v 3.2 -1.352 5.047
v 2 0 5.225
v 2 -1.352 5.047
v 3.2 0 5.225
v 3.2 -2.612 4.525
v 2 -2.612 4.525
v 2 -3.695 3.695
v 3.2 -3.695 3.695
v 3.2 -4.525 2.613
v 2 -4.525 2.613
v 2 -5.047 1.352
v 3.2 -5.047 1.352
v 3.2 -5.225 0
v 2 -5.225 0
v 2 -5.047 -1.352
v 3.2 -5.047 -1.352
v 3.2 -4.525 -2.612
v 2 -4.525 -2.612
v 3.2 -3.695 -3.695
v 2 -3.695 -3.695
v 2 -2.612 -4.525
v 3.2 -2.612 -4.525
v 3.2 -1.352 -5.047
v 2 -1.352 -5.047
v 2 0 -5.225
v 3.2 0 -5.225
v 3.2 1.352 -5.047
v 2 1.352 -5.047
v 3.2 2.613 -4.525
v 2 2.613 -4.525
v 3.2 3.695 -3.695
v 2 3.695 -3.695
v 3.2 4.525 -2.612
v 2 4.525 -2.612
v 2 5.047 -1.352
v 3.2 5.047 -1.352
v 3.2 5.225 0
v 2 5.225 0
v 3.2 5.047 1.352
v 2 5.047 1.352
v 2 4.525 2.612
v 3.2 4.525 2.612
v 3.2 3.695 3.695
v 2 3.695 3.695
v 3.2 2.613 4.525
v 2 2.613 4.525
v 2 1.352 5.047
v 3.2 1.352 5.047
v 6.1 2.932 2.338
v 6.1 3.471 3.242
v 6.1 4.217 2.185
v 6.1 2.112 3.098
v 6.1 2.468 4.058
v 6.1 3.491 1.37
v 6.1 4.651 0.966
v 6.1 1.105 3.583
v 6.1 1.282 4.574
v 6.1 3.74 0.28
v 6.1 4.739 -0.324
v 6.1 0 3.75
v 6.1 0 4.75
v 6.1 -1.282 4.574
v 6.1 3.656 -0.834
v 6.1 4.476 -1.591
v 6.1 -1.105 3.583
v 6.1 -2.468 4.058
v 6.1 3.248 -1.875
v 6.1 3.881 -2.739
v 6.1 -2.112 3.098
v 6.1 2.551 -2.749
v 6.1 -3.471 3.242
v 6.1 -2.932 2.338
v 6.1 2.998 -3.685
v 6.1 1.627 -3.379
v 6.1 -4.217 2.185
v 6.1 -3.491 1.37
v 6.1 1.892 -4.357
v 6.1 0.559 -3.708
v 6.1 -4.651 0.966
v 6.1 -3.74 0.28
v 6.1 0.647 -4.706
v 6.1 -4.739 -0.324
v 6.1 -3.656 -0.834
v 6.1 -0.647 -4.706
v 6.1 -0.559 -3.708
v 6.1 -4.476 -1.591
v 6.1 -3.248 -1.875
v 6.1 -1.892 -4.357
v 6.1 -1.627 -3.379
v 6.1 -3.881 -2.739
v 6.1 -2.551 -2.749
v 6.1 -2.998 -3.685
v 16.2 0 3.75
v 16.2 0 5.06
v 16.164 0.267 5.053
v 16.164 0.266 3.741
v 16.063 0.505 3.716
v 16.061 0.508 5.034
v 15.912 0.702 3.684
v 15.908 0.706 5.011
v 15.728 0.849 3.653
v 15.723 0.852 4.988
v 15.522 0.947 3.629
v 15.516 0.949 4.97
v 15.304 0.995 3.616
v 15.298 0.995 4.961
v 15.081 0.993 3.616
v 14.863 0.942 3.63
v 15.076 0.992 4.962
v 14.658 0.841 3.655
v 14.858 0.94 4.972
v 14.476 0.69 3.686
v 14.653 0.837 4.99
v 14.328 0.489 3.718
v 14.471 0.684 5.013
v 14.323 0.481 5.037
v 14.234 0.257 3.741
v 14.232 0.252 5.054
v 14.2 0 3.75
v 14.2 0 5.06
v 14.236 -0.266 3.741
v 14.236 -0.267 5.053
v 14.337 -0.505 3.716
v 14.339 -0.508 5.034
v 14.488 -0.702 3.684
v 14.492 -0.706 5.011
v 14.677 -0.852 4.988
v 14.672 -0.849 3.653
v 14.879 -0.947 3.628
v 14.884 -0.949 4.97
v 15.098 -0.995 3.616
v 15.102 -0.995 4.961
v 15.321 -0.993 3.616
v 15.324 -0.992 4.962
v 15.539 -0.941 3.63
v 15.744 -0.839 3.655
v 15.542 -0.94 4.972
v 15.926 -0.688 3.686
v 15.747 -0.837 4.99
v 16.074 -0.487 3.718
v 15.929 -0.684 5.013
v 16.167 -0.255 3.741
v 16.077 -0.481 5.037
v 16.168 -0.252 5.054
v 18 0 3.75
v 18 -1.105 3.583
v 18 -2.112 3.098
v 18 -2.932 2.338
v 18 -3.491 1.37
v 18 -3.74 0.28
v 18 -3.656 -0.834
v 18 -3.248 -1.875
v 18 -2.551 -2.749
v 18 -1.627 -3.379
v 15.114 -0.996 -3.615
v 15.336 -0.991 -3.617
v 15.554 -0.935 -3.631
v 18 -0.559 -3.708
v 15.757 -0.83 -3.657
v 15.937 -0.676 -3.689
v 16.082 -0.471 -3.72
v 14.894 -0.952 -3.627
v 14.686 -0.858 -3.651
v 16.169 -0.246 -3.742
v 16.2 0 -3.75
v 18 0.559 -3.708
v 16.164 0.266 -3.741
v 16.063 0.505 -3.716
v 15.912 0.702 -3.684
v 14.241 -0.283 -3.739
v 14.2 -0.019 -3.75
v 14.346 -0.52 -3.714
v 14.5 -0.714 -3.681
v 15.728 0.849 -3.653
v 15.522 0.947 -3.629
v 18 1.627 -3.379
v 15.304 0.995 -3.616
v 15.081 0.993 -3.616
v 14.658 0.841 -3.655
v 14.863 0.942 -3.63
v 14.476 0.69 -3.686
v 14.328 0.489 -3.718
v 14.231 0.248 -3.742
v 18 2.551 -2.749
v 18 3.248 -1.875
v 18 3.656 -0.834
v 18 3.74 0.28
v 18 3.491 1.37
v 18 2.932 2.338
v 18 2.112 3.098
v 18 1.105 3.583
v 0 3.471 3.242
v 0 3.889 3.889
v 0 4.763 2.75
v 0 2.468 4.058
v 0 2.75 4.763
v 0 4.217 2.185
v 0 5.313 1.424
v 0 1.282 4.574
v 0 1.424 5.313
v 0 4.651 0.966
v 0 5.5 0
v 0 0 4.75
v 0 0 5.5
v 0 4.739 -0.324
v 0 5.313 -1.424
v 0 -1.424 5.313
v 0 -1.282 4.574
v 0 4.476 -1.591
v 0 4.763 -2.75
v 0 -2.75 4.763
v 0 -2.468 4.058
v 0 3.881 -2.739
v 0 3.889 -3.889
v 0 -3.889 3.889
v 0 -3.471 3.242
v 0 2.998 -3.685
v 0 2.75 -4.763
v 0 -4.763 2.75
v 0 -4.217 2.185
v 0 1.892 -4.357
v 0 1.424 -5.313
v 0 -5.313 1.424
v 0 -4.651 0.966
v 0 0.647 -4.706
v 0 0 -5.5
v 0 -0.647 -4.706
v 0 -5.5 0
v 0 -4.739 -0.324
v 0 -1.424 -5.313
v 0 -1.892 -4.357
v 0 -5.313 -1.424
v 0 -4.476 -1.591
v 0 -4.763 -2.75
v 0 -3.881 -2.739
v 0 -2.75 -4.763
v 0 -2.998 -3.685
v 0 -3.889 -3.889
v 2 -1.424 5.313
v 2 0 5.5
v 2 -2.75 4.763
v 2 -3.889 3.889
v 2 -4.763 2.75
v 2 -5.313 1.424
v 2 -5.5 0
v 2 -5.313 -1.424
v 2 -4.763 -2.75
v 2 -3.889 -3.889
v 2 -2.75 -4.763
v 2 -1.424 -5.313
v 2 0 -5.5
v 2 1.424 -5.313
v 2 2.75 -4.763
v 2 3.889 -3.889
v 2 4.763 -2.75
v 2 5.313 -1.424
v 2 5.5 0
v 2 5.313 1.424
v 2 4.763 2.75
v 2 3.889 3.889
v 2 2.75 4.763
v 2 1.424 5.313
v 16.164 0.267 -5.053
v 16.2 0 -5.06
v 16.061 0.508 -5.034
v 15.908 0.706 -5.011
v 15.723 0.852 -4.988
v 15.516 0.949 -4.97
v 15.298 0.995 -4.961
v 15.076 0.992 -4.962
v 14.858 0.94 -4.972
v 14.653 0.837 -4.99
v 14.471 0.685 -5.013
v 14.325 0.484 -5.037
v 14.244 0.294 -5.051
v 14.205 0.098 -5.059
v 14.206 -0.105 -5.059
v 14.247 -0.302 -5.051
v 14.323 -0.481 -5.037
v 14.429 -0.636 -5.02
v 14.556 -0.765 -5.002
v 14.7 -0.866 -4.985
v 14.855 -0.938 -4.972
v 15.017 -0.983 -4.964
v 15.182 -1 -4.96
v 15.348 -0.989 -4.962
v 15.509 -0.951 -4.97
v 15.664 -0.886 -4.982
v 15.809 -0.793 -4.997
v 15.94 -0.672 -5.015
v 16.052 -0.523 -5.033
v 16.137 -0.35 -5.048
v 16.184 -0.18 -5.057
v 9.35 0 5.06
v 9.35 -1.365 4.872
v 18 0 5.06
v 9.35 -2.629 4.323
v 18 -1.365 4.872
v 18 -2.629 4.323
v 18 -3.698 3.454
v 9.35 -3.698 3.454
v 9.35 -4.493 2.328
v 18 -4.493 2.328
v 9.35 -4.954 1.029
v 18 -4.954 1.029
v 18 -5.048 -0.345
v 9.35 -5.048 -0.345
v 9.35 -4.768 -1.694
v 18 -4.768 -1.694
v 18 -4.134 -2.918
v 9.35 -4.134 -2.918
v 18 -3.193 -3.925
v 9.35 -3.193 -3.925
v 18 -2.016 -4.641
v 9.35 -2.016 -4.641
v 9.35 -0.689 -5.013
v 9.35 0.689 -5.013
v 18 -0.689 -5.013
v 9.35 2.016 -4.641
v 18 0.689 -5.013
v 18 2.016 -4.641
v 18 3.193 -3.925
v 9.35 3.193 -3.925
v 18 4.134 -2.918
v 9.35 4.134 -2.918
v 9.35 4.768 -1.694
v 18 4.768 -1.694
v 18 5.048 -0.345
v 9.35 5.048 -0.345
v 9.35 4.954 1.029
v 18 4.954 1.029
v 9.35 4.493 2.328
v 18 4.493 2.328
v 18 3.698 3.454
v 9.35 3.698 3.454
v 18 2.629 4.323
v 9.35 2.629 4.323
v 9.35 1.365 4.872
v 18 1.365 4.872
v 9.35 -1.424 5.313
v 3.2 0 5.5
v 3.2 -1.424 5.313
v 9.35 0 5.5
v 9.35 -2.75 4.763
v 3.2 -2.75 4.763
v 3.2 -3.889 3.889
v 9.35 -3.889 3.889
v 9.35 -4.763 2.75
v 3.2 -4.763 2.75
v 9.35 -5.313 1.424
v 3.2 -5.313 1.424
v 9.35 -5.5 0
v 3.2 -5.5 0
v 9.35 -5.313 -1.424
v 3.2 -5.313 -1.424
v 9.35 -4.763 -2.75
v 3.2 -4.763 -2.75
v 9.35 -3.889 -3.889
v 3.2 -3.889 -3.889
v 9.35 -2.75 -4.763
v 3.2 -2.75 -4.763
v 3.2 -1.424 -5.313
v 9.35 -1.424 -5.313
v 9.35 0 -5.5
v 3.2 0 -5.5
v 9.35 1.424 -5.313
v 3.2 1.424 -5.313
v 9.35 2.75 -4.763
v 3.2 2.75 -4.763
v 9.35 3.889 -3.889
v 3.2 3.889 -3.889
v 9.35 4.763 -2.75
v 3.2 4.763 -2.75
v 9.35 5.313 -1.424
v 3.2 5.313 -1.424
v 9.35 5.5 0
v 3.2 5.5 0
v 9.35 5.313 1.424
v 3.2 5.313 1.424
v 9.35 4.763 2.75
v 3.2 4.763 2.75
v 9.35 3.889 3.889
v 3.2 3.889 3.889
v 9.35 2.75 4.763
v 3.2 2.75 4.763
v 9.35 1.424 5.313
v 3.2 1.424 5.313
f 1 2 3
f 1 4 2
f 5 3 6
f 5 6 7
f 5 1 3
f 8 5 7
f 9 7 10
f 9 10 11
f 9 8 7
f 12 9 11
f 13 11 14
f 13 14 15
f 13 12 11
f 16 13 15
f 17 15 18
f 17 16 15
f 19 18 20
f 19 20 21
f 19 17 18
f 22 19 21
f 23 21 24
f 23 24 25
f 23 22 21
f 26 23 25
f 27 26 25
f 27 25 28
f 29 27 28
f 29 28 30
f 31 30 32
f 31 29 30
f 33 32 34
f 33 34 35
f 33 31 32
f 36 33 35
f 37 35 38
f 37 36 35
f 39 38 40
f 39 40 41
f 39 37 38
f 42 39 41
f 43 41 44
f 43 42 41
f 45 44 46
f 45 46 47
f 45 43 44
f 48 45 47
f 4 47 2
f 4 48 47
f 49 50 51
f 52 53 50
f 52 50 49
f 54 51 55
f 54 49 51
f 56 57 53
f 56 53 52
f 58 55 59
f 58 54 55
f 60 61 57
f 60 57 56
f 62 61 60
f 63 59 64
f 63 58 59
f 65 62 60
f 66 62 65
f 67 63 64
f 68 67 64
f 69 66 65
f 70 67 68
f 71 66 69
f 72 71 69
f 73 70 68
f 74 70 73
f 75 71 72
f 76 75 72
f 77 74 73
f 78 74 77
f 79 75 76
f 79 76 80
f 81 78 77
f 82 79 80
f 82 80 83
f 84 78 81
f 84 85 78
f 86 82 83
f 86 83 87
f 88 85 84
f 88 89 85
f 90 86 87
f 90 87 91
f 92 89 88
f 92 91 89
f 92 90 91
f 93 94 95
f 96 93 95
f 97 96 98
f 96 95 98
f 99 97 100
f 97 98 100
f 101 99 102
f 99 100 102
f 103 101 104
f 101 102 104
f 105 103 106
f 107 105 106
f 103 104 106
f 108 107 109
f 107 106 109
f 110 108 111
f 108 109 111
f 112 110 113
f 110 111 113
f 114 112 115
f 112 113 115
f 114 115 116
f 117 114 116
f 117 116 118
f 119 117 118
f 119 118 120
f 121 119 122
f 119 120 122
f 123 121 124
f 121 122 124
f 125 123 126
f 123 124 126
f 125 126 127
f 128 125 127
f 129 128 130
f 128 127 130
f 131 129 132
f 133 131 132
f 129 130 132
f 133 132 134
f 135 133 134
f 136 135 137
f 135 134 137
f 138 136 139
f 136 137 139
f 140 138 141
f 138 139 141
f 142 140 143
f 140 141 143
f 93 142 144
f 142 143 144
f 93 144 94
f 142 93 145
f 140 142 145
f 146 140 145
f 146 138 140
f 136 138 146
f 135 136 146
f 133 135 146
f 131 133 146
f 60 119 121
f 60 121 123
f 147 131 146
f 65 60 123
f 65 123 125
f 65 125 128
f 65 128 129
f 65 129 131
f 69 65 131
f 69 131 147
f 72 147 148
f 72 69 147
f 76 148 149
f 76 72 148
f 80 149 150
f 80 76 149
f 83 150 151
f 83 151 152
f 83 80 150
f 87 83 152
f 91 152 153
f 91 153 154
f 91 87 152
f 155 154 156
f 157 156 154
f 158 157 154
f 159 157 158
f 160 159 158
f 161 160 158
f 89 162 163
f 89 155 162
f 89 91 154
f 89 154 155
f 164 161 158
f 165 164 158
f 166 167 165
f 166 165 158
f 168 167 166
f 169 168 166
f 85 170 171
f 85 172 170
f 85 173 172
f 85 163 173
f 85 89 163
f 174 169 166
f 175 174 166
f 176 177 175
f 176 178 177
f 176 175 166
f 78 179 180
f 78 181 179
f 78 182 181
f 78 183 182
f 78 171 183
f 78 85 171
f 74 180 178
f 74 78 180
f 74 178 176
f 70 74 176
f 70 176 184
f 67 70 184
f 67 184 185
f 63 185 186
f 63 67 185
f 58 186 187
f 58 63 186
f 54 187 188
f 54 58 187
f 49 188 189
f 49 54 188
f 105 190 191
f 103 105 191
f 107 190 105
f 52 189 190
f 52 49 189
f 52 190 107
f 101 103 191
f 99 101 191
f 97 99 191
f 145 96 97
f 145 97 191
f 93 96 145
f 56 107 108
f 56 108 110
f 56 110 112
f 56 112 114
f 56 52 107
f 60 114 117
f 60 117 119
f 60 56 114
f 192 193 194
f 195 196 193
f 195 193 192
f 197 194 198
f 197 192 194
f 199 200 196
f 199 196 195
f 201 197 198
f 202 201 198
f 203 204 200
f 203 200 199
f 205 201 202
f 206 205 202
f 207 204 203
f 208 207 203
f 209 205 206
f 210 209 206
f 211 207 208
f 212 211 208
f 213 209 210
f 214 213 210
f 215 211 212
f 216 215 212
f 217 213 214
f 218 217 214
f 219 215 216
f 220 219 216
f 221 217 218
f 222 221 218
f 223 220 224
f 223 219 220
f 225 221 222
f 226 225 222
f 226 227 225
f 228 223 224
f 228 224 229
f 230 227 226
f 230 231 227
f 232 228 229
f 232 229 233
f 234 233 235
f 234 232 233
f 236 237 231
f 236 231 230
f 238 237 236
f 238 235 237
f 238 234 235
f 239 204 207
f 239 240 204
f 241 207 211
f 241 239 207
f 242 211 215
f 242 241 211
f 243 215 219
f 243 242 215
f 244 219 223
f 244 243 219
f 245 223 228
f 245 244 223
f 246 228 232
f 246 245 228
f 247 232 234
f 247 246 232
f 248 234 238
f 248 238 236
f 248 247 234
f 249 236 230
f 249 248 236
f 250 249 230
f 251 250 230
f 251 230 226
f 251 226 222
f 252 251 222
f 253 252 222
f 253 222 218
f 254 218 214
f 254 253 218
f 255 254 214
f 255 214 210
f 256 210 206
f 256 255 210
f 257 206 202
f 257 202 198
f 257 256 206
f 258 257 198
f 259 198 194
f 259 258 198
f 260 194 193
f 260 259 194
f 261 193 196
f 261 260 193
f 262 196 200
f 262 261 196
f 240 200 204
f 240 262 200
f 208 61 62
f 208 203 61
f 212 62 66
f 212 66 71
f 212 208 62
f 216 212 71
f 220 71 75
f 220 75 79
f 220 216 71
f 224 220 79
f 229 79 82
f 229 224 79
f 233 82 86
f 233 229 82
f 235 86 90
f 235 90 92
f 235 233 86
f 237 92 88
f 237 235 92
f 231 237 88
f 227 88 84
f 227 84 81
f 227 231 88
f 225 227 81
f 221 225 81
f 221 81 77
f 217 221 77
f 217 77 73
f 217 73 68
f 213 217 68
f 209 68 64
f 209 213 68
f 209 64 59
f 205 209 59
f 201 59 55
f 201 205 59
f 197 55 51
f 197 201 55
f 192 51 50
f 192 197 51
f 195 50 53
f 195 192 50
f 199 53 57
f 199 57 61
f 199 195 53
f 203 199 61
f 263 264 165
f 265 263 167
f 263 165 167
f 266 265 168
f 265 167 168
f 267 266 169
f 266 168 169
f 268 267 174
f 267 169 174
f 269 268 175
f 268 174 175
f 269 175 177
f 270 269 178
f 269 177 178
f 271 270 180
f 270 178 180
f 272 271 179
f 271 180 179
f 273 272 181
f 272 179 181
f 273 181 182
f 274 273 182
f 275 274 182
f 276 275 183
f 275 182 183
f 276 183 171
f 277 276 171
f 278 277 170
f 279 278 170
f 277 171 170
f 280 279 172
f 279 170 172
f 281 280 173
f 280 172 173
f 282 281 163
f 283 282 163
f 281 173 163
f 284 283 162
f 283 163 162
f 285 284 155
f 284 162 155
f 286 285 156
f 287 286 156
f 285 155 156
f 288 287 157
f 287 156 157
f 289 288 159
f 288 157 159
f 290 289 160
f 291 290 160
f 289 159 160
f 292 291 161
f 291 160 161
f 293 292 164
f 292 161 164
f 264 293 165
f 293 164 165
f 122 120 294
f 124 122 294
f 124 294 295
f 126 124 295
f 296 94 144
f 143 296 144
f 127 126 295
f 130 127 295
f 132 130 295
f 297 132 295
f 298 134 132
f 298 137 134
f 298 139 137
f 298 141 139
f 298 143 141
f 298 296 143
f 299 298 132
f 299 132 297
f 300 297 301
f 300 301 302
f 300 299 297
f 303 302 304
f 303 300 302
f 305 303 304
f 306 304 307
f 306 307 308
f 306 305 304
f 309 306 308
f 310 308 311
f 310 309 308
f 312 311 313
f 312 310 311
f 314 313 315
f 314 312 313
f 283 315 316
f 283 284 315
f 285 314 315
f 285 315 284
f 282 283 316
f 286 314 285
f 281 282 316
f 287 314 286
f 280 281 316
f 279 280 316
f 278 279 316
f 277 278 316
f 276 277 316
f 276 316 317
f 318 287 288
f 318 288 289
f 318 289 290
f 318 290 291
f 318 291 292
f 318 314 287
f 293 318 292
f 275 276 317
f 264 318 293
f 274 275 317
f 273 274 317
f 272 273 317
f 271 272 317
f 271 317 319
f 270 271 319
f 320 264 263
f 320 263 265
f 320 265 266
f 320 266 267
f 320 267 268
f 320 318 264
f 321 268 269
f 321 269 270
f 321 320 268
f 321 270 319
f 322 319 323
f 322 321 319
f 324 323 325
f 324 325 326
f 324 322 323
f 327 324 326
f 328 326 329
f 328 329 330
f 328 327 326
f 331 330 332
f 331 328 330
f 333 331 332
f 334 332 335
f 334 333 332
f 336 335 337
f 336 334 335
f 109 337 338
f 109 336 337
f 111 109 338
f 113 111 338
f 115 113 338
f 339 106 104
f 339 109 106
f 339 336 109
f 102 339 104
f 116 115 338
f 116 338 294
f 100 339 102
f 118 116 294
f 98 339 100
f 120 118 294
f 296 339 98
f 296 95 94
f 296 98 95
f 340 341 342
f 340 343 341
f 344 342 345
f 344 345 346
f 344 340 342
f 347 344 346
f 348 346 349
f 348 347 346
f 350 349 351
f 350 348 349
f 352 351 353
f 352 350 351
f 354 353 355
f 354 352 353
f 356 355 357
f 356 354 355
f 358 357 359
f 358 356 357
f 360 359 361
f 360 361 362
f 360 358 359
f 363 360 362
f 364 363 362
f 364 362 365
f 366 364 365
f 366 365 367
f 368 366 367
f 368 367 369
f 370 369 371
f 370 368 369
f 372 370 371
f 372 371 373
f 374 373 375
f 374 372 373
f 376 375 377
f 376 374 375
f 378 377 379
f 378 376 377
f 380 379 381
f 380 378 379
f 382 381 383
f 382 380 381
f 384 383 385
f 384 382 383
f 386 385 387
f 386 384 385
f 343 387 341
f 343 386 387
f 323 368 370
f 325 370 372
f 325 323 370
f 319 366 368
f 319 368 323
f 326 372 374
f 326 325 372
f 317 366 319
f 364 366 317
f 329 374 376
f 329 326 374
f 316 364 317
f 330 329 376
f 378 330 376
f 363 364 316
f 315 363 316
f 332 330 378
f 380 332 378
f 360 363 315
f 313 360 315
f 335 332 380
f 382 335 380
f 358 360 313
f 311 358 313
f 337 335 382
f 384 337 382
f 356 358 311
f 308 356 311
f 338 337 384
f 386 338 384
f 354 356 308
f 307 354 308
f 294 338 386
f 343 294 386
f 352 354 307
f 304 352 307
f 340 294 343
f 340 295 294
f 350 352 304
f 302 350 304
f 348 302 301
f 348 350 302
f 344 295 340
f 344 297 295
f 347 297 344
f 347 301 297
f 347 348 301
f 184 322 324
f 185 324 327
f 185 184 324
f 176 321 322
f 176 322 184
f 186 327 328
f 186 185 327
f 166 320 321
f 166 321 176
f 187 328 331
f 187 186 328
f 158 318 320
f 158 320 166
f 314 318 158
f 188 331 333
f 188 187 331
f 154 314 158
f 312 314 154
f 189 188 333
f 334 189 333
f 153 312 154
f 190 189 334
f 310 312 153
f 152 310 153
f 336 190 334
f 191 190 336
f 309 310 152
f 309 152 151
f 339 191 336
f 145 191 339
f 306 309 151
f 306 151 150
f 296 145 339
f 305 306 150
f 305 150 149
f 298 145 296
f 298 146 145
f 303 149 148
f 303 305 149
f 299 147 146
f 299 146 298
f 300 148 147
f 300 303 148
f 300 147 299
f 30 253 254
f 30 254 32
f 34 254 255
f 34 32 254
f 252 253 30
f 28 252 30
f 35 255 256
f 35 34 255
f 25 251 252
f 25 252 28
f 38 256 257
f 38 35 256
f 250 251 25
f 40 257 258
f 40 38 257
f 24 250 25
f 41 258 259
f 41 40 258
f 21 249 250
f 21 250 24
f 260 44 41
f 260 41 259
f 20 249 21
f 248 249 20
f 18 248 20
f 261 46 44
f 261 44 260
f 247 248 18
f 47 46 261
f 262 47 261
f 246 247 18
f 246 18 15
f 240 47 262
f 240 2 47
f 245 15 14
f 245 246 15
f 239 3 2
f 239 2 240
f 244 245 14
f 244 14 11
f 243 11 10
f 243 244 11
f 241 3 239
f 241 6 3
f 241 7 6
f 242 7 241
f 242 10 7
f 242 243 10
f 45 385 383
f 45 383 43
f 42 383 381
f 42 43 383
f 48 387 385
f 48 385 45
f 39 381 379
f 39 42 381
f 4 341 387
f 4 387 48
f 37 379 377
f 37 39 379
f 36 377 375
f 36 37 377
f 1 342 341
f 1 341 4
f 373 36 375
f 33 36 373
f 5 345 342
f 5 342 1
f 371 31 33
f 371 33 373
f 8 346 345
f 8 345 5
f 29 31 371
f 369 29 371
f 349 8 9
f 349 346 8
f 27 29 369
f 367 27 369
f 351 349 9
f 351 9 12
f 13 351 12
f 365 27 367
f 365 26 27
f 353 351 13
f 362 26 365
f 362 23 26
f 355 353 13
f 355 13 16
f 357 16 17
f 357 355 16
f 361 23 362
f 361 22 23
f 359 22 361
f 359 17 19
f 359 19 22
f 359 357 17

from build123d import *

# Parameters (mm, degrees)
ESBO_O2_R             = 1
CORTE_EXTRUS_O1_DEPTH = 10


with BuildPart() as part:
    # Esboço1 → Revolução1 (revolve)
    with BuildSketch(Plane.XY, mode=Mode.PRIVATE) as revolu_o1_sk:
        Polygon((0, 5.5), (2, 5.5), (2, 5.225), (3.2, 5.225), (3.2, 5.5), (9.35, 5.5), (9.35, 5.06), (18, 5.06), (18, 3.75), (6.1, 3.75), (6.1, 4.75), (0, 4.75), align=None)
    revolve(revolu_o1_sk.sketch.rotate(Axis((0, 0, 0), (1, 0, 0)), 90), axis=Axis((0, 0, 0), (1, 0, 0)))

    # Esboço2 → Corte-extrusão1 (cut, symmetric)
    with BuildSketch(Plane.XY):
        with Locations((15.2, 0)):
            Circle(ESBO_O2_R)
    extrude(amount=CORTE_EXTRUS_O1_DEPTH, both=True, mode=Mode.SUBTRACT)


solid = part.part
